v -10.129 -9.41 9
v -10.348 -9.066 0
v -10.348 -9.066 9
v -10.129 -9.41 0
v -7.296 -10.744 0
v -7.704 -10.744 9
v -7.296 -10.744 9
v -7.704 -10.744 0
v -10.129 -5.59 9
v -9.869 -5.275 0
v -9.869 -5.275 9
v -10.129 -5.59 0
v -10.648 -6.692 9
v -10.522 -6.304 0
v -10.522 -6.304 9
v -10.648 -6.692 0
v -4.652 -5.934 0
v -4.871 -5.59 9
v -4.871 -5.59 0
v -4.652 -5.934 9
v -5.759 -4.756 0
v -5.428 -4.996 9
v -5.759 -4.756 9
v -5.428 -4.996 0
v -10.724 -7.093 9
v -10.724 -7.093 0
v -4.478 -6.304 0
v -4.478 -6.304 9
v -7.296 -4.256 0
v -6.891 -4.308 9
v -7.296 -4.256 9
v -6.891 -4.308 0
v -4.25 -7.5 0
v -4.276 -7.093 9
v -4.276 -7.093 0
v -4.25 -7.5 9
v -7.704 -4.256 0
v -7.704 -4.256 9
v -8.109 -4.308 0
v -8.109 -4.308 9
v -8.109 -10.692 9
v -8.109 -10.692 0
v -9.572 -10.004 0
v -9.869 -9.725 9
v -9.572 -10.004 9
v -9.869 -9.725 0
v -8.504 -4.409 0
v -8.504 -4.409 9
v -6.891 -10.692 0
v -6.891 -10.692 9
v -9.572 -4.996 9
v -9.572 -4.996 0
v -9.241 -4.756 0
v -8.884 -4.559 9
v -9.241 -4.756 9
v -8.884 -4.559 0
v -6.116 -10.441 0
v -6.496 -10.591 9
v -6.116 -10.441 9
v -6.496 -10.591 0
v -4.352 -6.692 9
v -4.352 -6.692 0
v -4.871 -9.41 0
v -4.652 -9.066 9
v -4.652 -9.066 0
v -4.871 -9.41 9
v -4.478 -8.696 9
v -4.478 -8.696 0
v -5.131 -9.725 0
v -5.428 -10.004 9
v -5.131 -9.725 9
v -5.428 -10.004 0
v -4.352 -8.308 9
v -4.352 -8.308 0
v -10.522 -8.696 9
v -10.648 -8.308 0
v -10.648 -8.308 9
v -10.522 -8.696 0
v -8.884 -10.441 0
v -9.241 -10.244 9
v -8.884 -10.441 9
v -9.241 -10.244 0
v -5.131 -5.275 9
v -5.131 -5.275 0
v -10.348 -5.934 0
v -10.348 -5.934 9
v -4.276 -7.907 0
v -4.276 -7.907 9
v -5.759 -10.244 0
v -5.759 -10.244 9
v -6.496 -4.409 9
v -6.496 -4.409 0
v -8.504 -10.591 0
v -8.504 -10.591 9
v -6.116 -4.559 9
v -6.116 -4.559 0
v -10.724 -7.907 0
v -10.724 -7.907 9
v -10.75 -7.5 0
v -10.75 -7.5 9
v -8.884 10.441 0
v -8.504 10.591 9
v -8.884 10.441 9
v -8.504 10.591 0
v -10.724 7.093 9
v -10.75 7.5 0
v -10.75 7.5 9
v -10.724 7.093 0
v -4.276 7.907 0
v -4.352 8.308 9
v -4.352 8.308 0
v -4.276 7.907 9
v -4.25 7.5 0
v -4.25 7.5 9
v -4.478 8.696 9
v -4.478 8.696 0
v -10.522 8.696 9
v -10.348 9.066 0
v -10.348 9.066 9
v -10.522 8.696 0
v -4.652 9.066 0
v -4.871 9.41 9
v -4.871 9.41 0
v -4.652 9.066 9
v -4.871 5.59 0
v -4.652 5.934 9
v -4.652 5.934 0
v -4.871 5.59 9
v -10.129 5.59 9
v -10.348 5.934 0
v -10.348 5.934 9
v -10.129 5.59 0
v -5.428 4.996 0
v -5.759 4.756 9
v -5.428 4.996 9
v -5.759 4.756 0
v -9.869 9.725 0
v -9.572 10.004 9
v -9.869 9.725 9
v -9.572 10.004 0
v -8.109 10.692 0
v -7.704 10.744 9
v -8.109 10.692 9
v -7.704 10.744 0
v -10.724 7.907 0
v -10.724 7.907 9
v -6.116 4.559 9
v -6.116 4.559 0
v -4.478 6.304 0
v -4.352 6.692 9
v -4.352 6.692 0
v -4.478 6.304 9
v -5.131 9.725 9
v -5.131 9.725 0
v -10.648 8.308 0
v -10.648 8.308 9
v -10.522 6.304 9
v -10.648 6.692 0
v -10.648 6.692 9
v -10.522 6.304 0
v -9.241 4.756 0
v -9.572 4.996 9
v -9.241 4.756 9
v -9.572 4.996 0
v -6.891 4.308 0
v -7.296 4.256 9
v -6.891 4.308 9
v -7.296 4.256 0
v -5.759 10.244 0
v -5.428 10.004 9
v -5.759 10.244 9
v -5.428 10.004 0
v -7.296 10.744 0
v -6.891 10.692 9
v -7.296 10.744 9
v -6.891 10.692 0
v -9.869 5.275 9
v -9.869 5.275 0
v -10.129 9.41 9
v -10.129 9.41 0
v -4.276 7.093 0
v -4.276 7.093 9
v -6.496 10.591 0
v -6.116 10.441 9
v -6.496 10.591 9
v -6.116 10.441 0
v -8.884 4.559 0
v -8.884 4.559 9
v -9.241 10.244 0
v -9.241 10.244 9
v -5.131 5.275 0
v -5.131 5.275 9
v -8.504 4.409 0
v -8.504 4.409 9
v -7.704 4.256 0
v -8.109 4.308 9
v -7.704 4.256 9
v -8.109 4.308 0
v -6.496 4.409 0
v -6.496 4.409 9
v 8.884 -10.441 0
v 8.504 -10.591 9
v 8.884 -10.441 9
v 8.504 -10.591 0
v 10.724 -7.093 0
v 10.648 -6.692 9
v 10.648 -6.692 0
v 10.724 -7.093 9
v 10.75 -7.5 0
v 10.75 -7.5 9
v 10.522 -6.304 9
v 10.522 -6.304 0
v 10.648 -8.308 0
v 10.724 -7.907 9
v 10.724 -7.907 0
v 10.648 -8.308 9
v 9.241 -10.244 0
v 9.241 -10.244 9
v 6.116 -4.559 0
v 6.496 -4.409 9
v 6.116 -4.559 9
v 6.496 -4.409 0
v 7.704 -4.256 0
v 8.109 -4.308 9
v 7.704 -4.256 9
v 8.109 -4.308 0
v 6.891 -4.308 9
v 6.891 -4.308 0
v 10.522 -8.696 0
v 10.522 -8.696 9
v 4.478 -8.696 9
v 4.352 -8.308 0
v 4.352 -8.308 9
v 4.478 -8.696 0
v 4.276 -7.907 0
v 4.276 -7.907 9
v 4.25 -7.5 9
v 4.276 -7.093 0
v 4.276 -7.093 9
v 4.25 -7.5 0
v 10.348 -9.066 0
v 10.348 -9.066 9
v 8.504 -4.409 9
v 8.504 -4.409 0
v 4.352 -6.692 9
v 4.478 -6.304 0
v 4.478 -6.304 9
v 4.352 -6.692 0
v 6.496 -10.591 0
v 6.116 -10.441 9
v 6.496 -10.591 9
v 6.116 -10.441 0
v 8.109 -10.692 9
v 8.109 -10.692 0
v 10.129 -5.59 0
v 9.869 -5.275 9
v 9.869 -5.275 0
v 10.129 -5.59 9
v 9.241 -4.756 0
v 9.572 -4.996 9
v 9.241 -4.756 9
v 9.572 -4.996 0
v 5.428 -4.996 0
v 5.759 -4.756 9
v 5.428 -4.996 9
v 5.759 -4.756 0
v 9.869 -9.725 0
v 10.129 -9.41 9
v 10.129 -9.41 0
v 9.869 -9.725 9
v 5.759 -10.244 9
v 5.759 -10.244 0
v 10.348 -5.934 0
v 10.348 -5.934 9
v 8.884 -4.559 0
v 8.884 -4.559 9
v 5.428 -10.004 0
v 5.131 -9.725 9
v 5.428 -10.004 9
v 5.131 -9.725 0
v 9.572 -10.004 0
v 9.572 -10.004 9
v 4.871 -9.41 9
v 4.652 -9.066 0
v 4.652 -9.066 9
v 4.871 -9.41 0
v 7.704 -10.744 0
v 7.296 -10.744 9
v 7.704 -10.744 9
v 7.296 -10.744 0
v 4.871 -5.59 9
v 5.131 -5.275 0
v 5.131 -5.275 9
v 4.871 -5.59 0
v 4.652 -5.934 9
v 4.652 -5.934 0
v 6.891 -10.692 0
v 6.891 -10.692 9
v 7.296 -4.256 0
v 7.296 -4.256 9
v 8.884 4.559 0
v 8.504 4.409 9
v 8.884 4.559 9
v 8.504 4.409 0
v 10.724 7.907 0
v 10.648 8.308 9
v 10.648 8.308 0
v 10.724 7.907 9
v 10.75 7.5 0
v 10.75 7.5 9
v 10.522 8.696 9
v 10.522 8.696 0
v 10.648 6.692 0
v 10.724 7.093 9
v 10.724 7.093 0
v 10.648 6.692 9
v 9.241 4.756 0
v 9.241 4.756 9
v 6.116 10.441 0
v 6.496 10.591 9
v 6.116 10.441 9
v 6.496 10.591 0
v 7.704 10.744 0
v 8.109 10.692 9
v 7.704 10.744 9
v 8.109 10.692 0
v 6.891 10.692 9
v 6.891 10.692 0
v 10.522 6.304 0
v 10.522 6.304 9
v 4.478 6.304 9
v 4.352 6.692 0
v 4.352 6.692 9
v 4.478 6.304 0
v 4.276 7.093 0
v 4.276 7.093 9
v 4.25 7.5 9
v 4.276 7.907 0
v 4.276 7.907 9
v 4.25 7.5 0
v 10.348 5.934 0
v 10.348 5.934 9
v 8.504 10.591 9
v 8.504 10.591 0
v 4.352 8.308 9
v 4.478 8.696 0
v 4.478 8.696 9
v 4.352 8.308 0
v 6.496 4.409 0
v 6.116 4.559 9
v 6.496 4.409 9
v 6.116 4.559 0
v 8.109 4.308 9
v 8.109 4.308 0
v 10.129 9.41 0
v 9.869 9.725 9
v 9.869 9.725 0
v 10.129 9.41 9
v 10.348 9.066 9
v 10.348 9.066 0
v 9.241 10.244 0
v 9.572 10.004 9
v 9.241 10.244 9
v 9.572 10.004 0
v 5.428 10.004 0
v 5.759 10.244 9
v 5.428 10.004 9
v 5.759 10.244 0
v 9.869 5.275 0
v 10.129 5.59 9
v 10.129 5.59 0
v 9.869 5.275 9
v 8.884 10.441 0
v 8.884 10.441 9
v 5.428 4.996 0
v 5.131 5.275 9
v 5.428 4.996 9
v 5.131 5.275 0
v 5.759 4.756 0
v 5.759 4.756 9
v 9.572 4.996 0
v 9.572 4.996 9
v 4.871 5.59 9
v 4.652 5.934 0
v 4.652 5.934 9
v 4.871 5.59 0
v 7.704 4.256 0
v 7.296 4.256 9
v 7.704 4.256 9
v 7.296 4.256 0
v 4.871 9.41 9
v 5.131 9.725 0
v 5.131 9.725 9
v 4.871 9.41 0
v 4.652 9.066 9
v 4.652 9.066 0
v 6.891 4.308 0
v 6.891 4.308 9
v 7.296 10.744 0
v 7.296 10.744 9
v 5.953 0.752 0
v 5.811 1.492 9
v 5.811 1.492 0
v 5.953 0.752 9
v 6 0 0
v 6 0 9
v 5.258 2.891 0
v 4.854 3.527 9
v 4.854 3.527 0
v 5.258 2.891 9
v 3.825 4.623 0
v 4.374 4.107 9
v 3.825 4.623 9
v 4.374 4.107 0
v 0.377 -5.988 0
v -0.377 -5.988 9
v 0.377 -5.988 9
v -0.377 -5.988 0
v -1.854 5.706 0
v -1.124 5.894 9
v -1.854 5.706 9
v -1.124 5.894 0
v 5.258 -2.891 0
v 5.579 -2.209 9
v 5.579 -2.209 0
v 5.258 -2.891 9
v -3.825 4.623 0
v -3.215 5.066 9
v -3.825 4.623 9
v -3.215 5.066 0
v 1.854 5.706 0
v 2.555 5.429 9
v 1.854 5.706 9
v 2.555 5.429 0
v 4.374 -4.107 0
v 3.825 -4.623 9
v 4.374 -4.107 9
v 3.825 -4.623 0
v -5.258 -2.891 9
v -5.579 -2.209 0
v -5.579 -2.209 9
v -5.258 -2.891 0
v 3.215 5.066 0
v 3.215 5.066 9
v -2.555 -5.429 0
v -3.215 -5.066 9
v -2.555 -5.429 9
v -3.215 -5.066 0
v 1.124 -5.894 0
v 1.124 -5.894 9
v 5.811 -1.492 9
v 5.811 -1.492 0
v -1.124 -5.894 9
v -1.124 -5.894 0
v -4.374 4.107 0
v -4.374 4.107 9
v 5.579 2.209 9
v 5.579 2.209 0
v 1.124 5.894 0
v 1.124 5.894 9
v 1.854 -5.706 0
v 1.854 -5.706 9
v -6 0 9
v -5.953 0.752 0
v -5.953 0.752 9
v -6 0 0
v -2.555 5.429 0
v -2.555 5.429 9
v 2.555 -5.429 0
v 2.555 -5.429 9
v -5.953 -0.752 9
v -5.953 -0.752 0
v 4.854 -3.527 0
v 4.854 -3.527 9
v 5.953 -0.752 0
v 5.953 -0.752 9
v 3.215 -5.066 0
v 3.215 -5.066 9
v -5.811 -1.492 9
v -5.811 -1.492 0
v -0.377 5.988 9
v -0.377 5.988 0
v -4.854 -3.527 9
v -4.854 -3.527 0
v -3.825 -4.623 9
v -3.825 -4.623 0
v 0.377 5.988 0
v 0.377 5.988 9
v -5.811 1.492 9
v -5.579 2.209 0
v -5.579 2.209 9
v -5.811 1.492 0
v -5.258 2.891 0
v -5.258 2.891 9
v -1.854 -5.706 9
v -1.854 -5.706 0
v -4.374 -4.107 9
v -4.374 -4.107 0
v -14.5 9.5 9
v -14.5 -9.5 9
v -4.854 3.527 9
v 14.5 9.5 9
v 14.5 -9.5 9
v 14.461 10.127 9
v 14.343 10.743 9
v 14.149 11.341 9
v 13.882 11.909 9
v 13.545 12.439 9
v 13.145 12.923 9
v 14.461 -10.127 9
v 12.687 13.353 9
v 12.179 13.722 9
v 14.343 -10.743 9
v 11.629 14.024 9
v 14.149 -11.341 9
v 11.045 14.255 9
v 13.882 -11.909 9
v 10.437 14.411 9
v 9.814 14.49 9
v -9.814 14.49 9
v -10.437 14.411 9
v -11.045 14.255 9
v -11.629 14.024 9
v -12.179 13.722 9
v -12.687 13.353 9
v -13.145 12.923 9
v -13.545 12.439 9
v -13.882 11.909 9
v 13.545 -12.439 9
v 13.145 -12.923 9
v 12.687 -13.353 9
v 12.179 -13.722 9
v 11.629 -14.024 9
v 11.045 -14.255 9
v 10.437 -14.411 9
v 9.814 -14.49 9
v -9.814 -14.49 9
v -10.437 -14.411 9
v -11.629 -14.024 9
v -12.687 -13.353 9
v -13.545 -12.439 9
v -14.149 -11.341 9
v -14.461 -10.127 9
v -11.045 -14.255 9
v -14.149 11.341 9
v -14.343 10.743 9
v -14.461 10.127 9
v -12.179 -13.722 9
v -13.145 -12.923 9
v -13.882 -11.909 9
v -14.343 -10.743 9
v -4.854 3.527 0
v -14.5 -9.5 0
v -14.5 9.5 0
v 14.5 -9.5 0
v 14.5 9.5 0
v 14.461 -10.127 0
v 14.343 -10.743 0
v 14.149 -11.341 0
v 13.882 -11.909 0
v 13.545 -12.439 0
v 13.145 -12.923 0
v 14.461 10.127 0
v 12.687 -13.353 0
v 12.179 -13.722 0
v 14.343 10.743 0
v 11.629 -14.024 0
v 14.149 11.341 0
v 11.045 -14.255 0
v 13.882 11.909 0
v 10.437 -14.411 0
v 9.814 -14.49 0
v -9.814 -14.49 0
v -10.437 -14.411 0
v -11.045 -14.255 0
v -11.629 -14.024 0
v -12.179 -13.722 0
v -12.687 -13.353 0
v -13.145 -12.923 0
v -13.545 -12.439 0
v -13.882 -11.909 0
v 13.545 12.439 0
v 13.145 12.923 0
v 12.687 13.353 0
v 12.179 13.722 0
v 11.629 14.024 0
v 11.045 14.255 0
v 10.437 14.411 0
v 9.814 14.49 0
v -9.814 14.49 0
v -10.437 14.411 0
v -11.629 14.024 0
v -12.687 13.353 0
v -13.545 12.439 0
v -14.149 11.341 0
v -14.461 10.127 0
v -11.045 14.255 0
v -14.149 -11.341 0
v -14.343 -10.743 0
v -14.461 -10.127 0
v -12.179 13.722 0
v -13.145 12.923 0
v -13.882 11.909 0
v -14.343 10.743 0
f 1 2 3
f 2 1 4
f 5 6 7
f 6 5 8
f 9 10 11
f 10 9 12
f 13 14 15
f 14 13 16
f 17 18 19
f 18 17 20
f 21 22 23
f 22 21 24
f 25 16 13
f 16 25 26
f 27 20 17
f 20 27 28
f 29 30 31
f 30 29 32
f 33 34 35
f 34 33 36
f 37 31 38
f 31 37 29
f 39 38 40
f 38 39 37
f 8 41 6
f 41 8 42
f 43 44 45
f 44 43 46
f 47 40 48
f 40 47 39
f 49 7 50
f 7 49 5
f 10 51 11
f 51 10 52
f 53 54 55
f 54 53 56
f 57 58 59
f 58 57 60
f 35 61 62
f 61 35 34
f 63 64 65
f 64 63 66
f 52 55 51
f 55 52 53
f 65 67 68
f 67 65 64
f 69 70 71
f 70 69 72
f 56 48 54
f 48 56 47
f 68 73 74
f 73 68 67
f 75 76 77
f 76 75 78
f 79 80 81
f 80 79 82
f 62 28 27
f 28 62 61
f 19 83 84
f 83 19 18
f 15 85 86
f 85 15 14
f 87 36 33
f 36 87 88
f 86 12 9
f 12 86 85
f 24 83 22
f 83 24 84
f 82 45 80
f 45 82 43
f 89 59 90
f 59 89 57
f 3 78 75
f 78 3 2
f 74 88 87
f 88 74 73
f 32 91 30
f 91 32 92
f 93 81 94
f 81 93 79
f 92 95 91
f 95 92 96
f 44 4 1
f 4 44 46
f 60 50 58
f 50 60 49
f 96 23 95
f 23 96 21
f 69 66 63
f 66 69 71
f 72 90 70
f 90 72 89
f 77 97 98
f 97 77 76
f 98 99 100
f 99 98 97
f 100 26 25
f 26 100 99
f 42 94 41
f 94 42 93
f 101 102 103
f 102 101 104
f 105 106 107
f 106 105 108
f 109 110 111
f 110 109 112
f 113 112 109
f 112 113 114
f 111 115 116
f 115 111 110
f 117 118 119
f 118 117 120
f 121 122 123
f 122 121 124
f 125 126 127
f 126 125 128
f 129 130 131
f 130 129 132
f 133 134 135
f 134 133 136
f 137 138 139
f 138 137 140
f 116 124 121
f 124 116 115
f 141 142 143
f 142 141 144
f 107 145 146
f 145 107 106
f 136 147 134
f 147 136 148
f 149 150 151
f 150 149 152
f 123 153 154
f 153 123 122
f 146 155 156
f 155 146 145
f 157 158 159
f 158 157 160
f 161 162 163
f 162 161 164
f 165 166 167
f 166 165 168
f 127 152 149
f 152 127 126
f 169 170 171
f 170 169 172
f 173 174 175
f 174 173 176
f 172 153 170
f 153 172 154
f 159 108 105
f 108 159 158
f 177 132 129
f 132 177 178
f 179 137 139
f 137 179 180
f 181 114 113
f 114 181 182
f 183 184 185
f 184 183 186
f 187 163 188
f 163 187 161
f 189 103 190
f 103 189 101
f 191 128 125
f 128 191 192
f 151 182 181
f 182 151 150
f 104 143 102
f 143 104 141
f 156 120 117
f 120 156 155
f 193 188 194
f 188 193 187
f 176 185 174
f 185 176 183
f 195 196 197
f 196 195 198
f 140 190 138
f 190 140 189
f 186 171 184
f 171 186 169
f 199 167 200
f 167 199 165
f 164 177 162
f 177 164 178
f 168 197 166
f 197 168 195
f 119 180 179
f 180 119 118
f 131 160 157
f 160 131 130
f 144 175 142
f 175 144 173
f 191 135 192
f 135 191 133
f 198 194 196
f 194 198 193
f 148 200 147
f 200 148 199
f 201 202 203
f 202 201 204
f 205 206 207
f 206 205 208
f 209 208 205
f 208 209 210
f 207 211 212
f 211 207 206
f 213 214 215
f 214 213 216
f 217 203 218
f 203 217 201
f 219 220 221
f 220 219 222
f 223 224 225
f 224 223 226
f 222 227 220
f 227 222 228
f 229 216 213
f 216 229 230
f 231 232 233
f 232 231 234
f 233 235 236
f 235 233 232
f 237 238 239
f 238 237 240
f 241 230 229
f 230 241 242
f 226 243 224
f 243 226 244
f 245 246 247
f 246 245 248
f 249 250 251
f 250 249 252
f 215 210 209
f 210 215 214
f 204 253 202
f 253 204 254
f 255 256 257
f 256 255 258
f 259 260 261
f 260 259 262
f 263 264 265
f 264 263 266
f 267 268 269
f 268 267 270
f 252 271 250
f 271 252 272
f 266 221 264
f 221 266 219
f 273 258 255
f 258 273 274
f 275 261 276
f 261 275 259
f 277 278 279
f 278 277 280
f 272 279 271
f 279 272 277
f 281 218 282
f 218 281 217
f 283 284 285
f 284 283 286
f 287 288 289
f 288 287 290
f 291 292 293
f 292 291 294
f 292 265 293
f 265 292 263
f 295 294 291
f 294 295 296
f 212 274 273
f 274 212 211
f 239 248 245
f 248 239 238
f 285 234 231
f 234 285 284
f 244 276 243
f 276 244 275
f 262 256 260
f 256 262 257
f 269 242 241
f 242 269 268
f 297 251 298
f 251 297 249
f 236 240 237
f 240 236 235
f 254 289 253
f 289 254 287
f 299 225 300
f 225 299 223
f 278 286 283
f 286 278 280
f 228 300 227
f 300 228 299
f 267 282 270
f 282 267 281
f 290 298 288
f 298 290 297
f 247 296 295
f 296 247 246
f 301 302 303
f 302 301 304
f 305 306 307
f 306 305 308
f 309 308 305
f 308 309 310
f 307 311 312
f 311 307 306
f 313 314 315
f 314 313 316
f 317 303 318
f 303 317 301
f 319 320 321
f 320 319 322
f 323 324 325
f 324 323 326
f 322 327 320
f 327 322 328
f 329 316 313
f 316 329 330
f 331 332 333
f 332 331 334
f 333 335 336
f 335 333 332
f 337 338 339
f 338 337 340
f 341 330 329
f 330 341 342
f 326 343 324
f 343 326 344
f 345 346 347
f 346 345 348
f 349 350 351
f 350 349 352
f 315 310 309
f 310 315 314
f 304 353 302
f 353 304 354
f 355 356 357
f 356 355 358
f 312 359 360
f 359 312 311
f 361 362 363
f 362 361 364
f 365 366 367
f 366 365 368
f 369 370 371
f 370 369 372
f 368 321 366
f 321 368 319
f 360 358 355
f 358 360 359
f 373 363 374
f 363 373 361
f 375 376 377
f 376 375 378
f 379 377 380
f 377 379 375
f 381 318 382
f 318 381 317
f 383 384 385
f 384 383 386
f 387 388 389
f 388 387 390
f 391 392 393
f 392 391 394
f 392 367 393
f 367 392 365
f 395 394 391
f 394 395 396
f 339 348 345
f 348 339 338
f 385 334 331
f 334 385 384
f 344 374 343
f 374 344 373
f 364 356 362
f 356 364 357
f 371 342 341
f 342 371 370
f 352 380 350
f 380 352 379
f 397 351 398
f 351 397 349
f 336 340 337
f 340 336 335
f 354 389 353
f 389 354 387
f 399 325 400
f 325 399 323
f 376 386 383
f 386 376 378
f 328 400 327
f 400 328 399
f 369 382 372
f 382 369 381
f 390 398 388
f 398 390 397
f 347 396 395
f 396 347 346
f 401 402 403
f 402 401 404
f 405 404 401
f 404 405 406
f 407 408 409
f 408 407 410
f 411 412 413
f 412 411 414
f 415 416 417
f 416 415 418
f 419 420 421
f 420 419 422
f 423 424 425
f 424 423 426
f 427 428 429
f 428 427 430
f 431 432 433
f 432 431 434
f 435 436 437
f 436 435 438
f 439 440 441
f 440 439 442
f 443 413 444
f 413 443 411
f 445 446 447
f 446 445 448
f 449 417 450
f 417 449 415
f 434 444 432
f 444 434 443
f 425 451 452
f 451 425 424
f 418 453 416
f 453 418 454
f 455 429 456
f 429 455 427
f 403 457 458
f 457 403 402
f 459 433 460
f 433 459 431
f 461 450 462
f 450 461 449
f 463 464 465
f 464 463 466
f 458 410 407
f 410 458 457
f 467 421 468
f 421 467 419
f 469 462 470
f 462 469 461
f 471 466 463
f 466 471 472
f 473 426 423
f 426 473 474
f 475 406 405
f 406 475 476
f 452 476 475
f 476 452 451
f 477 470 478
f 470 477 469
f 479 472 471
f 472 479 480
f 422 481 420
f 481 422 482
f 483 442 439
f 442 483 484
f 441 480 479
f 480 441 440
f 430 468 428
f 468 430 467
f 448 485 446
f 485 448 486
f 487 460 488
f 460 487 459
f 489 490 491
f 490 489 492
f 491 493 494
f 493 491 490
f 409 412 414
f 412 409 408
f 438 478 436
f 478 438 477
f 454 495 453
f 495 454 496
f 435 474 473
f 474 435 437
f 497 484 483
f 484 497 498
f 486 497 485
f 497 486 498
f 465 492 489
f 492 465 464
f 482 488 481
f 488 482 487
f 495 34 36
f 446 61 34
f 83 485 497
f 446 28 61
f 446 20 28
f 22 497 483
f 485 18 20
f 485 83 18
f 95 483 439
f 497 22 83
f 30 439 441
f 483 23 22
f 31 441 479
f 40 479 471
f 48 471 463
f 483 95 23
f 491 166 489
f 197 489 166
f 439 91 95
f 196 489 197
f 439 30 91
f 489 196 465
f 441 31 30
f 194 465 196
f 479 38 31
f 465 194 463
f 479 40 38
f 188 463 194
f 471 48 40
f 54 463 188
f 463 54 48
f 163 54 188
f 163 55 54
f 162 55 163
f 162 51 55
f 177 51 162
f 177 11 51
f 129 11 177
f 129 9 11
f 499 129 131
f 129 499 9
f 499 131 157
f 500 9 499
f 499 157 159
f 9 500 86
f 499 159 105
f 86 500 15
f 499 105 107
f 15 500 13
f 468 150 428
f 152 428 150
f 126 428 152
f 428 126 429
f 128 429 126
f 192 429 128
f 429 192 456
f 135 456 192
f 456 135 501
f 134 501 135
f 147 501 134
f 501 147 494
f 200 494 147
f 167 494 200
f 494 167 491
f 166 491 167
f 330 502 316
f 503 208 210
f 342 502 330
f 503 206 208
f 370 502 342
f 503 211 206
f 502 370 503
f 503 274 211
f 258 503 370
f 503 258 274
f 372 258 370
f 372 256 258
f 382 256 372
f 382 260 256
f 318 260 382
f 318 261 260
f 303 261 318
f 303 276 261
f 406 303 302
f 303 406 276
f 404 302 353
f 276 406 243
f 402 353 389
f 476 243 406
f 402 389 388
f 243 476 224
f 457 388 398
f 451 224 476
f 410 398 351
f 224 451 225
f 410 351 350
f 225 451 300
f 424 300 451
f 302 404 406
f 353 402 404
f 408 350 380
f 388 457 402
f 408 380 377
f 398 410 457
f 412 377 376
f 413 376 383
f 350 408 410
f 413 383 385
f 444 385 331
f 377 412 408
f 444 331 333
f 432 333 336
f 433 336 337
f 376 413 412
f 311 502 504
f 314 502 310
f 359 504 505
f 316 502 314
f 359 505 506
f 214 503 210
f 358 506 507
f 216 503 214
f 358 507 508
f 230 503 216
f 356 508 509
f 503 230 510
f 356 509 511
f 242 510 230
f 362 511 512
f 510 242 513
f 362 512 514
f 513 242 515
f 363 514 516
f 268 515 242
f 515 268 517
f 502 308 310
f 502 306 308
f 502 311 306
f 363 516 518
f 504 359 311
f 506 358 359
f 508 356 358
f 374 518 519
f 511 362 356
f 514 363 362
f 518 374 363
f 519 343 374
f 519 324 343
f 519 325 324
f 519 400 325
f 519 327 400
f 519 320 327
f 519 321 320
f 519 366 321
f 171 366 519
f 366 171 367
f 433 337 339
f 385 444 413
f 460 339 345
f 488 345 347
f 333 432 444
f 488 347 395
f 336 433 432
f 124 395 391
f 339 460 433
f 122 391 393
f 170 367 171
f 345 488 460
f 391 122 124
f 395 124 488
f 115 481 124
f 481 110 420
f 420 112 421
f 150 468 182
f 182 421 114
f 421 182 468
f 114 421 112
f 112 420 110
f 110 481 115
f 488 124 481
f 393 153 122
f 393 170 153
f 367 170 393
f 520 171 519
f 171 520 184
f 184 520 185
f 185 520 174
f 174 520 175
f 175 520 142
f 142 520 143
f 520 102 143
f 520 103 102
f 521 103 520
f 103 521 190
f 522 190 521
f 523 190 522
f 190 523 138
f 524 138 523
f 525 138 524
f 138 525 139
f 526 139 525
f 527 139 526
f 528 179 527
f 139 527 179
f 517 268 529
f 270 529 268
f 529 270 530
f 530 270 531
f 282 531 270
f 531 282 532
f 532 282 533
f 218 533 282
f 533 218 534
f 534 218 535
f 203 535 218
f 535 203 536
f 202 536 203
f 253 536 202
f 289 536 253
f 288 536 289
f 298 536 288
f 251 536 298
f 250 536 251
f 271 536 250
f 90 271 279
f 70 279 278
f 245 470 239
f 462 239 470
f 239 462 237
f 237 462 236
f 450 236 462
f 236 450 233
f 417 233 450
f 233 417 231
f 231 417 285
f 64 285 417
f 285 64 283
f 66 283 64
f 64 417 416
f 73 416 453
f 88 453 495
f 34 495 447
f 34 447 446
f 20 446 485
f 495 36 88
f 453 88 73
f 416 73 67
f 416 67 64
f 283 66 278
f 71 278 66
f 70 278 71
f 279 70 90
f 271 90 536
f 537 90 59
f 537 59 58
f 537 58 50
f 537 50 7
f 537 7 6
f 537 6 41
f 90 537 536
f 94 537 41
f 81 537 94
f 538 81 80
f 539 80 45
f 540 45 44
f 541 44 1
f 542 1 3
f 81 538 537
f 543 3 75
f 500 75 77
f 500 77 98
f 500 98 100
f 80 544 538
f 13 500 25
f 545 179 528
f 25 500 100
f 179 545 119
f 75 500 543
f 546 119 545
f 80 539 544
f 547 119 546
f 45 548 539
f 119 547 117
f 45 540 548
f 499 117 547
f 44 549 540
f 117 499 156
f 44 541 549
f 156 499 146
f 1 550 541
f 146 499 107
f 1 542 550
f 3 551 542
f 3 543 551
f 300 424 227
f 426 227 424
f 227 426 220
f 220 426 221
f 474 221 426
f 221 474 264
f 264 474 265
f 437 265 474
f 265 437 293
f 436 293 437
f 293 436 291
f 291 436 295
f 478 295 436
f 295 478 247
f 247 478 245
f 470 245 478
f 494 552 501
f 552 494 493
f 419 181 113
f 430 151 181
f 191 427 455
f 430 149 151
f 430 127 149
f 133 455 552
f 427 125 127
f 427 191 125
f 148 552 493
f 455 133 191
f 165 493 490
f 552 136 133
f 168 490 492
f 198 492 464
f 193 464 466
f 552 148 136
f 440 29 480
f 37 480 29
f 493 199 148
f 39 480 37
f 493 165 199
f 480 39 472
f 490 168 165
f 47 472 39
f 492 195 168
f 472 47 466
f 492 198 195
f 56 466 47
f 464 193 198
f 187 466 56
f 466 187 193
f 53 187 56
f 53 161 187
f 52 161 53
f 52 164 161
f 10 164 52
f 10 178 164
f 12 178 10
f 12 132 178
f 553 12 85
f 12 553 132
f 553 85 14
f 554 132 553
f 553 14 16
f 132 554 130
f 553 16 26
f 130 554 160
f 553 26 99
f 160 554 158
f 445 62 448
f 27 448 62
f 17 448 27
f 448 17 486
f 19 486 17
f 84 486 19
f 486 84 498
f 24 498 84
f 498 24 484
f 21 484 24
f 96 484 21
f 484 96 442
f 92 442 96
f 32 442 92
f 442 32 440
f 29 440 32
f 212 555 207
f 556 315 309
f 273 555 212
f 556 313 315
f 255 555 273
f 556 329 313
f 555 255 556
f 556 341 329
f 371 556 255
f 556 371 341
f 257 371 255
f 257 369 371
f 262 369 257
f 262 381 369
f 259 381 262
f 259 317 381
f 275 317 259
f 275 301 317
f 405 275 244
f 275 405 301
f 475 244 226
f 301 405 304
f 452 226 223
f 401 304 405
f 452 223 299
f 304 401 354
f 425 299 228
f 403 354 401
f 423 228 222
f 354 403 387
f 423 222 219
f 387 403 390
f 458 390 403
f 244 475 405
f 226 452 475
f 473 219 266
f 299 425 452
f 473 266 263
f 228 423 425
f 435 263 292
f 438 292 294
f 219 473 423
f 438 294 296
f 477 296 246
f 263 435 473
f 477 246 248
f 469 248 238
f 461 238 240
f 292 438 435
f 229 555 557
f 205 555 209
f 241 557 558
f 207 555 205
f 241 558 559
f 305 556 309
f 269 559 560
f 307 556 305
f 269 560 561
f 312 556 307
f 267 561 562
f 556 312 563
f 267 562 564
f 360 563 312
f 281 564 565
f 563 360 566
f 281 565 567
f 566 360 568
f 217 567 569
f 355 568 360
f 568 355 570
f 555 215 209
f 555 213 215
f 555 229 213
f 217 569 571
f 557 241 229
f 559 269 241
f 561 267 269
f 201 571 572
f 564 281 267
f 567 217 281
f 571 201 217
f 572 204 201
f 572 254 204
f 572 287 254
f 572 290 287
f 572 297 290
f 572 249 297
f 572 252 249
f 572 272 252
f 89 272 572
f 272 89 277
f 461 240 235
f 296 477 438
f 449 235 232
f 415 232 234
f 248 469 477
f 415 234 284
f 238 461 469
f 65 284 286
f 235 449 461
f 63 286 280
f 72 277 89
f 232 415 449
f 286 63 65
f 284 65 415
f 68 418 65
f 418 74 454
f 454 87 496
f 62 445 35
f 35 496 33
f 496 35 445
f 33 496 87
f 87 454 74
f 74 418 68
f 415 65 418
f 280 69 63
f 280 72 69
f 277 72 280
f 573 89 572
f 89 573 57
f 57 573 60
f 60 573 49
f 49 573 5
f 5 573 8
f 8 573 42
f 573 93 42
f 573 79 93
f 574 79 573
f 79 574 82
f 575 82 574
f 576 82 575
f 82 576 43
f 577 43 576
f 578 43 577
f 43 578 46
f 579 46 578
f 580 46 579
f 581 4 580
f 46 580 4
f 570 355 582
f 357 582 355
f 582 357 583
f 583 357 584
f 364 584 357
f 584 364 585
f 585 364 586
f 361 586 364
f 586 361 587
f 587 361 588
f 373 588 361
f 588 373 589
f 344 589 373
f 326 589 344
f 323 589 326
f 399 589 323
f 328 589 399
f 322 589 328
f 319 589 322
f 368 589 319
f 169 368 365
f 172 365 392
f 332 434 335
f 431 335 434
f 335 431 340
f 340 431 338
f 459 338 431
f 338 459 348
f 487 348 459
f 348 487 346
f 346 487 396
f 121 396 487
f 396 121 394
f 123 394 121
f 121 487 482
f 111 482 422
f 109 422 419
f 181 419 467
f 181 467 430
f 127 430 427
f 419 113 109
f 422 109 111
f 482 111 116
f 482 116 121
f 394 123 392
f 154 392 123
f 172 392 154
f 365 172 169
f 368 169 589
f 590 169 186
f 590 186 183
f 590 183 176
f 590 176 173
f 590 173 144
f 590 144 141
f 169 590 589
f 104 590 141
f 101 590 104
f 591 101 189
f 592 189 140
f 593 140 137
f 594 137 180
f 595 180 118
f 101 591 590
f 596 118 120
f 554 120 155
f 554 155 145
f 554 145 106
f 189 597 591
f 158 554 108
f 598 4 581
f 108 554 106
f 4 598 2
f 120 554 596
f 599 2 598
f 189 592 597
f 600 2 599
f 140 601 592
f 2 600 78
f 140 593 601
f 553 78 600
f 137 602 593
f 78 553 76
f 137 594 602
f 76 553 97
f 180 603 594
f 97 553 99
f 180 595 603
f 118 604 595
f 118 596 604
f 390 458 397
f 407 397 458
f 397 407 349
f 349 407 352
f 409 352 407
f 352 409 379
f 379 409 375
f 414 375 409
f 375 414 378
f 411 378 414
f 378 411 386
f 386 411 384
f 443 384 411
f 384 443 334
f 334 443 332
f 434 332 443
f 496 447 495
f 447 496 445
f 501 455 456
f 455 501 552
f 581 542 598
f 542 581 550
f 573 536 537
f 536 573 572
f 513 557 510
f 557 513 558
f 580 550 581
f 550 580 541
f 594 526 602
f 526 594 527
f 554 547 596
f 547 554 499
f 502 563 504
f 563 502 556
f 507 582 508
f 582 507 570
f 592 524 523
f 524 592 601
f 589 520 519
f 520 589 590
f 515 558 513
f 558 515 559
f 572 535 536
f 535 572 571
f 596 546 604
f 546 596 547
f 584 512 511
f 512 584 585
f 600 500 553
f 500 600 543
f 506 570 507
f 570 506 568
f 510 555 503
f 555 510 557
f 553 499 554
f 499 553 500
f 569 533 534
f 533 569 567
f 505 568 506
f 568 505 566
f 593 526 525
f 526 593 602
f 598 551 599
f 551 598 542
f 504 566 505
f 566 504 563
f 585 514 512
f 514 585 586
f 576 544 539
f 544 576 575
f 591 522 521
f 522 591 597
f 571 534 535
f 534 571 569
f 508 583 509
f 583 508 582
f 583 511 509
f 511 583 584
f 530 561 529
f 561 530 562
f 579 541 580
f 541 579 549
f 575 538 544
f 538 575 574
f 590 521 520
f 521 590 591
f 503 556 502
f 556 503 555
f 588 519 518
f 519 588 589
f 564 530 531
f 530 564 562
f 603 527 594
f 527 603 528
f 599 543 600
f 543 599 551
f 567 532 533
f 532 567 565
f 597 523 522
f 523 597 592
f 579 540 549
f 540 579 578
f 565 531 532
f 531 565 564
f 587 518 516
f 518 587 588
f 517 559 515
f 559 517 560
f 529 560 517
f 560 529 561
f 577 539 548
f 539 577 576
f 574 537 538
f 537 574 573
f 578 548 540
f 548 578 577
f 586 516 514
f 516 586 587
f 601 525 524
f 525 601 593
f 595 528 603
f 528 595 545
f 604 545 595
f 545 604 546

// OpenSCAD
$fn = 50;


difference() {
	union() {
		hull() {
			translate(v = [-9.5000000000, 9.5000000000, 0]) {
				cylinder(h = 9, r = 5);
			}
			translate(v = [9.5000000000, 9.5000000000, 0]) {
				cylinder(h = 9, r = 5);
			}
			translate(v = [-9.5000000000, -9.5000000000, 0]) {
				cylinder(h = 9, r = 5);
			}
			translate(v = [9.5000000000, -9.5000000000, 0]) {
				cylinder(h = 9, r = 5);
			}
		}
	}
	union() {
		#translate(v = [-7.5000000000, -7.5000000000, -100.0000000000]) {
			cylinder(h = 200, r = 3.2500000000);
		}
		#translate(v = [-7.5000000000, 7.5000000000, -100.0000000000]) {
			cylinder(h = 200, r = 3.2500000000);
		}
		#translate(v = [7.5000000000, -7.5000000000, -100.0000000000]) {
			cylinder(h = 200, r = 3.2500000000);
		}
		#translate(v = [7.5000000000, 7.5000000000, -100.0000000000]) {
			cylinder(h = 200, r = 3.2500000000);
		}
		#cylinder(h = 9, r = 6.0000000000);
	}
}
